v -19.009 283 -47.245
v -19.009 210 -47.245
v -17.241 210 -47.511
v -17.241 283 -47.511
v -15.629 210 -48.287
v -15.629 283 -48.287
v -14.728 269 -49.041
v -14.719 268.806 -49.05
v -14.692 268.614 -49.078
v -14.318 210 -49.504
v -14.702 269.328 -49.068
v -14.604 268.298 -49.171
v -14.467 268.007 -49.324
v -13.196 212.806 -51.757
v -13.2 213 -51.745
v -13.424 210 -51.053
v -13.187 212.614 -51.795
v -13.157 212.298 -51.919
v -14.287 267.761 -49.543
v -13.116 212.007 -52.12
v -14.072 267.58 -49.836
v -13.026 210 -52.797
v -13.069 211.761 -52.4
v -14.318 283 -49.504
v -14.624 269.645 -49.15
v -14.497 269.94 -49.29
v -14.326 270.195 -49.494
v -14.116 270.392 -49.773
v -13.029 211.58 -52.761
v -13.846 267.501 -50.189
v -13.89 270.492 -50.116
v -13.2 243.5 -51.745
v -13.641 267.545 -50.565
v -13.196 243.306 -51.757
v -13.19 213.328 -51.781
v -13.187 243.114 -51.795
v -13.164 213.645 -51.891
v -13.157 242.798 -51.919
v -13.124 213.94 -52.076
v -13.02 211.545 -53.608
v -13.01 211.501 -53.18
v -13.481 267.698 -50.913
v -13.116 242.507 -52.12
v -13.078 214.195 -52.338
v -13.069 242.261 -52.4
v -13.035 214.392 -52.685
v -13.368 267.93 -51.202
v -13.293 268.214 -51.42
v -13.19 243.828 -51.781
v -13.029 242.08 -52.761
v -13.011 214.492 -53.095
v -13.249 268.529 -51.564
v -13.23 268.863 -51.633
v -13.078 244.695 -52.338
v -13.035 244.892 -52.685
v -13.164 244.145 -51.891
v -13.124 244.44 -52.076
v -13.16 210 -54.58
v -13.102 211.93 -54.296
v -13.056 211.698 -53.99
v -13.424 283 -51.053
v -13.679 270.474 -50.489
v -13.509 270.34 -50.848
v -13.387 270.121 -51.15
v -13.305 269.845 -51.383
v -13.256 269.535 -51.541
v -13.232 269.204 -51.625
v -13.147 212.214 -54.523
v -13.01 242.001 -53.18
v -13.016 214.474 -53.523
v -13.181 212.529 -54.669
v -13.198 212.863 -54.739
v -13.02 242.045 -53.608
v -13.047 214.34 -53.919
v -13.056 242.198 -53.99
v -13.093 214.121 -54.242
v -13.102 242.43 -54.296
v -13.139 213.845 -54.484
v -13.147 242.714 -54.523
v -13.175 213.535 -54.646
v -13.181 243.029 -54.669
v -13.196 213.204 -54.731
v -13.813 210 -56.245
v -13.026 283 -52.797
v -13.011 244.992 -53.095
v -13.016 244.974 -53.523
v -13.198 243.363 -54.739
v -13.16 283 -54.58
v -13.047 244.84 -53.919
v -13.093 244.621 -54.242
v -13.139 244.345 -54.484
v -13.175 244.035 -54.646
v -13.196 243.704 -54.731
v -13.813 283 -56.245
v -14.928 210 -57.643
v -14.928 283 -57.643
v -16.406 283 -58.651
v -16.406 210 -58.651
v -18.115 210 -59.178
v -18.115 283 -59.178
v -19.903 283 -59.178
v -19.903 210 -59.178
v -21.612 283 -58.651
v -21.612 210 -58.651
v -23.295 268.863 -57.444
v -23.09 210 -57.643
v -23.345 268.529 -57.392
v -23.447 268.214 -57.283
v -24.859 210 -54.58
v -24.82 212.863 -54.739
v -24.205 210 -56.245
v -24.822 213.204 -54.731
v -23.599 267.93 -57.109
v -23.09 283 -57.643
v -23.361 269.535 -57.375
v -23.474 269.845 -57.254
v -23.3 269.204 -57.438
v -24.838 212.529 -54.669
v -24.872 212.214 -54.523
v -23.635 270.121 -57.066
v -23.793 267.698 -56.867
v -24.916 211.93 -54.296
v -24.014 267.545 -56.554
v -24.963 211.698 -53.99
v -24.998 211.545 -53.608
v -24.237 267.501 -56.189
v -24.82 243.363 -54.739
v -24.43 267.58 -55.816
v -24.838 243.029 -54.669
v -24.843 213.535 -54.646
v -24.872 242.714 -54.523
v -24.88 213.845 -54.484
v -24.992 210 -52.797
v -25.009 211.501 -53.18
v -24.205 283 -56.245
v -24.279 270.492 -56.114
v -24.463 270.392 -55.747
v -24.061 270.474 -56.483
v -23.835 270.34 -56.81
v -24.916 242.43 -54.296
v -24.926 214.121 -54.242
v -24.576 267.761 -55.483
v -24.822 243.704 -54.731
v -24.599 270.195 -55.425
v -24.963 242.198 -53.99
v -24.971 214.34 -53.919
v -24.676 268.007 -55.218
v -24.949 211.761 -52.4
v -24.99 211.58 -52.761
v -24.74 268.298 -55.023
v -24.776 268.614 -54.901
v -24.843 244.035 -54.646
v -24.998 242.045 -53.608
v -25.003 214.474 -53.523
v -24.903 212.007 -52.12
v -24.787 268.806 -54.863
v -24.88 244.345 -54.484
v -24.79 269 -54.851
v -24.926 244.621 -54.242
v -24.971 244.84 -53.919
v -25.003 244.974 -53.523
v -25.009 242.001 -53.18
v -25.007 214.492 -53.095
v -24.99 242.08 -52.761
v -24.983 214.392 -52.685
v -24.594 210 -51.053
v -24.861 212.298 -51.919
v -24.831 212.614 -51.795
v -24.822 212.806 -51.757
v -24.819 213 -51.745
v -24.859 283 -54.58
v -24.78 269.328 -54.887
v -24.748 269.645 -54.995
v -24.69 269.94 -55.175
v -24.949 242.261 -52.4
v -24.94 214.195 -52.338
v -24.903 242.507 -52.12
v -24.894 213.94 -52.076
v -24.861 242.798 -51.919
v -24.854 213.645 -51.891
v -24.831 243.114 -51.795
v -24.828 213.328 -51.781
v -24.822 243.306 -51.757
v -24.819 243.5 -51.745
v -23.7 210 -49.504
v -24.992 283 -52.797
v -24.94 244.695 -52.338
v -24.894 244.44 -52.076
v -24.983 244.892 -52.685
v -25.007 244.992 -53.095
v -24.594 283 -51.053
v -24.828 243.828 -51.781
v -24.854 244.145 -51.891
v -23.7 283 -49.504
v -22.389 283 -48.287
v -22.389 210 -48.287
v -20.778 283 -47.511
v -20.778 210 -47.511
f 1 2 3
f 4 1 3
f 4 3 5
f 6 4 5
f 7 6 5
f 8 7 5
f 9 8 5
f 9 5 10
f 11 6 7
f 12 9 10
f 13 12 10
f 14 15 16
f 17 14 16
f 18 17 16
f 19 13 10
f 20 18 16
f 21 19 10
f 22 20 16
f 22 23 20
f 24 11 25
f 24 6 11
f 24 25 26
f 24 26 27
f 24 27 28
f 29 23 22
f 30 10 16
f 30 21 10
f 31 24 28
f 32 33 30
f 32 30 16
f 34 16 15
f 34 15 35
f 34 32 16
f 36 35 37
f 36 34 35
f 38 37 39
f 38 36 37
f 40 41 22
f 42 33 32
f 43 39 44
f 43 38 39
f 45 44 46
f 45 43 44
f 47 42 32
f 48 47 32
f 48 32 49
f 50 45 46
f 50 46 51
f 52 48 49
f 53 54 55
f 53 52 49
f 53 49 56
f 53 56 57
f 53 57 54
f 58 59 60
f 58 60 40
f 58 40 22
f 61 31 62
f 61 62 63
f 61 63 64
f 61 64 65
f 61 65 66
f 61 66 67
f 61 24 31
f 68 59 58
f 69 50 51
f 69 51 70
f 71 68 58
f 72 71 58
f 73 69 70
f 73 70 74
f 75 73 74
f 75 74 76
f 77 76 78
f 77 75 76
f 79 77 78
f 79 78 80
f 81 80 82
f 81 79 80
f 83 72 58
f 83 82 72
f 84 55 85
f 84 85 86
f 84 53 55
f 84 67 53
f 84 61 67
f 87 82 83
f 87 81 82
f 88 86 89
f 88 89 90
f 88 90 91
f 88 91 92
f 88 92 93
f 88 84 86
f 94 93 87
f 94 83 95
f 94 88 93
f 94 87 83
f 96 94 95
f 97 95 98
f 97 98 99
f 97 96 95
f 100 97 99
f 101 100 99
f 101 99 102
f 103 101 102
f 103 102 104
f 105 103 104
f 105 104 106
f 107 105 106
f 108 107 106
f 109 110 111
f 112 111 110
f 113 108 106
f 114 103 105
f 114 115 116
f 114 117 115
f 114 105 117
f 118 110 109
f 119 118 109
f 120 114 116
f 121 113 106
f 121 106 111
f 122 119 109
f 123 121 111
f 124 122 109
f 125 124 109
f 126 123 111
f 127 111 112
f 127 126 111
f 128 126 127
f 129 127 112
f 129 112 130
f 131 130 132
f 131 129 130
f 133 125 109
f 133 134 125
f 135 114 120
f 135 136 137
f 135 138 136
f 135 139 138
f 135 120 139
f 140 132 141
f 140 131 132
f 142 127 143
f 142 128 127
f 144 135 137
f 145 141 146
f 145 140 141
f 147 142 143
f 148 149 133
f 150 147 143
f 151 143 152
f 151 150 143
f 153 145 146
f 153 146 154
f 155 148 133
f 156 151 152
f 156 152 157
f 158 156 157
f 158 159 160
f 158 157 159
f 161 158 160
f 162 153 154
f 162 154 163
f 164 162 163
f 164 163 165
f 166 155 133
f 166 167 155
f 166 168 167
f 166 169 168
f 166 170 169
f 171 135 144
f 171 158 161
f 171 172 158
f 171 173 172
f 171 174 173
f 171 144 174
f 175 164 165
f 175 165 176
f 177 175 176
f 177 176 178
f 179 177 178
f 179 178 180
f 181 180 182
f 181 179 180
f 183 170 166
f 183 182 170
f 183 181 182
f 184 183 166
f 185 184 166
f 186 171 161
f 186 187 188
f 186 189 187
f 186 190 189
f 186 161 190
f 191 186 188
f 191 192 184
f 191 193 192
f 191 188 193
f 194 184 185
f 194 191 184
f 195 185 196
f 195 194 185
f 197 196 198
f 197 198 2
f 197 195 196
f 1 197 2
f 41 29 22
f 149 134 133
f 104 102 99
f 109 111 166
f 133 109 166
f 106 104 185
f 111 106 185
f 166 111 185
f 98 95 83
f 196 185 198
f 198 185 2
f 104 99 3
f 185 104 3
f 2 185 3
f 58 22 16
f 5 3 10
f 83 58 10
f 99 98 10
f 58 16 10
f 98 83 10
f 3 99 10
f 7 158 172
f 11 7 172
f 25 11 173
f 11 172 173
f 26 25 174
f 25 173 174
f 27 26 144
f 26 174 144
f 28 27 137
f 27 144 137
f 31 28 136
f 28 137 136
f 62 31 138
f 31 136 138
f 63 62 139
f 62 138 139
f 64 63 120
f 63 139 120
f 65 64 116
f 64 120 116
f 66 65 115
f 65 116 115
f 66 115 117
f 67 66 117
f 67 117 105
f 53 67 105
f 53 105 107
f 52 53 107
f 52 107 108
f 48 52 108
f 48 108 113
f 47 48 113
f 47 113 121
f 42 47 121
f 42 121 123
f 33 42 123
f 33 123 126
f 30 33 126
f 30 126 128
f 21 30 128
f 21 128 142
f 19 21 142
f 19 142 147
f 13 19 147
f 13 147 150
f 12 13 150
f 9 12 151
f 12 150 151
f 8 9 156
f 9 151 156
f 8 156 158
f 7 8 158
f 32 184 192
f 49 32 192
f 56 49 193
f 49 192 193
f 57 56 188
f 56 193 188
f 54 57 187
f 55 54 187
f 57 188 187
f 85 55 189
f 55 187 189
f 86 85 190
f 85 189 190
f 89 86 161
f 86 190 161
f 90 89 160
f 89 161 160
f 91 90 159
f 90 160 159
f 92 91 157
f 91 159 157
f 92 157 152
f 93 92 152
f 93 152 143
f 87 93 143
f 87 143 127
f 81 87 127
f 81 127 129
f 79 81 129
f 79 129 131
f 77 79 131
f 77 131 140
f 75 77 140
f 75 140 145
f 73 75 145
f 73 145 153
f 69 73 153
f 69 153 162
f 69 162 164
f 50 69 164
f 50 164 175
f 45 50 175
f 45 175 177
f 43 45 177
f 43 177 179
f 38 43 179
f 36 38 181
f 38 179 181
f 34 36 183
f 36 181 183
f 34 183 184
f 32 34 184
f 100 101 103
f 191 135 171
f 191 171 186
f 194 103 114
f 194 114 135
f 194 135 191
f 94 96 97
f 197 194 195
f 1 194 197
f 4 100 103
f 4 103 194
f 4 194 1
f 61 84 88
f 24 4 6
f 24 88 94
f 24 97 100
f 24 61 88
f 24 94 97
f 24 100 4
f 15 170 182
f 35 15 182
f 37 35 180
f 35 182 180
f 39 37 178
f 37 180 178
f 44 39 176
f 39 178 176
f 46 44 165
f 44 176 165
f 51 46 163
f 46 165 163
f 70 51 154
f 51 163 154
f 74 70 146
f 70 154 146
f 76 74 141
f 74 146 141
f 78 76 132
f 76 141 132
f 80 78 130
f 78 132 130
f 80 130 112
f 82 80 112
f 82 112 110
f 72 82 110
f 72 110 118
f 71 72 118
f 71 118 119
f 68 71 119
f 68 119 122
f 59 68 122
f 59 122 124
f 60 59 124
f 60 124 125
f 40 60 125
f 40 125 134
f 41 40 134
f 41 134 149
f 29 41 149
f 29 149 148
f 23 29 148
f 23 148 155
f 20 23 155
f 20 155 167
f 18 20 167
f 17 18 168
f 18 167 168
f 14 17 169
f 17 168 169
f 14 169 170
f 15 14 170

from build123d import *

# Parameters (mm, degrees)
TWELVE_MILLIMETRE_AXLE_STOCK_SKETCH_R = 6
TWELVE_MILLIMETRE_AXLE_STOCK_DEPTH    = 73
FRONT_COLLAR_PIN_SKETCH_R             = 1.5
FRONT_COLLAR_PIN_DEPTH                = 14
REAR_COLLAR_PIN_SKETCH_R              = 1.5
REAR_COLLAR_PIN_DEPTH                 = 14
HUB_DRIVE_PIN_SKETCH_R                = 1.5
HUB_DRIVE_PIN_DEPTH                   = 14


with BuildPart() as part:
    # Twelve millimetre axle stock sketch → Twelve millimetre axle stock (new body)
    with BuildSketch(Plane(origin=(0, -283, 0), x_dir=(1, 0, 0), z_dir=(0, 1, 0))):
        with Locations(Location((-19.009182883, 53.244882879, 0), (0, 0, 270))):
            Circle(TWELVE_MILLIMETRE_AXLE_STOCK_SKETCH_R)
    extrude(amount=TWELVE_MILLIMETRE_AXLE_STOCK_DEPTH)

    # Front collar pin sketch → Front collar pin (cut)
    with BuildSketch(Plane(origin=(-26.009182883, 0, 0), x_dir=(0, 0, -1), z_dir=(1, 0, 0))):
        with Locations(Location((53.244882879, -213, 0), (0, 0, 180))):
            Circle(FRONT_COLLAR_PIN_SKETCH_R)
    extrude(amount=FRONT_COLLAR_PIN_DEPTH, mode=Mode.SUBTRACT)

    # Rear collar pin sketch → Rear collar pin (cut)
    with BuildSketch(Plane(origin=(-26.009182883, 0, 0), x_dir=(0, 0, -1), z_dir=(1, 0, 0))):
        with Locations(Location((53.244882879, -243.5, 0), (0, 0, 180))):
            Circle(REAR_COLLAR_PIN_SKETCH_R)
    extrude(amount=REAR_COLLAR_PIN_DEPTH, mode=Mode.SUBTRACT)

    # Hub drive pin sketch → Hub drive pin (cut)
    with BuildSketch(Plane(origin=(-43.374775586, 0, -25.042438361), x_dir=(0.5000000000000001, 0, -0.8660254037844386), z_dir=(0.8660254037844386, 0, 0.5000000000000001))):
        with Locations(Location((36.606829753, -269, 0), (0, 0, 180))):
            Circle(HUB_DRIVE_PIN_SKETCH_R)
    extrude(amount=HUB_DRIVE_PIN_DEPTH, mode=Mode.SUBTRACT)


with BuildPart() as body_2:
    # Mirror1: mirrored copy
    add(part.part.mirror(Plane(origin=(0, 0, 0), x_dir=(0, 0, 1), z_dir=(0, -1, 0))))


solid = body_2.part
